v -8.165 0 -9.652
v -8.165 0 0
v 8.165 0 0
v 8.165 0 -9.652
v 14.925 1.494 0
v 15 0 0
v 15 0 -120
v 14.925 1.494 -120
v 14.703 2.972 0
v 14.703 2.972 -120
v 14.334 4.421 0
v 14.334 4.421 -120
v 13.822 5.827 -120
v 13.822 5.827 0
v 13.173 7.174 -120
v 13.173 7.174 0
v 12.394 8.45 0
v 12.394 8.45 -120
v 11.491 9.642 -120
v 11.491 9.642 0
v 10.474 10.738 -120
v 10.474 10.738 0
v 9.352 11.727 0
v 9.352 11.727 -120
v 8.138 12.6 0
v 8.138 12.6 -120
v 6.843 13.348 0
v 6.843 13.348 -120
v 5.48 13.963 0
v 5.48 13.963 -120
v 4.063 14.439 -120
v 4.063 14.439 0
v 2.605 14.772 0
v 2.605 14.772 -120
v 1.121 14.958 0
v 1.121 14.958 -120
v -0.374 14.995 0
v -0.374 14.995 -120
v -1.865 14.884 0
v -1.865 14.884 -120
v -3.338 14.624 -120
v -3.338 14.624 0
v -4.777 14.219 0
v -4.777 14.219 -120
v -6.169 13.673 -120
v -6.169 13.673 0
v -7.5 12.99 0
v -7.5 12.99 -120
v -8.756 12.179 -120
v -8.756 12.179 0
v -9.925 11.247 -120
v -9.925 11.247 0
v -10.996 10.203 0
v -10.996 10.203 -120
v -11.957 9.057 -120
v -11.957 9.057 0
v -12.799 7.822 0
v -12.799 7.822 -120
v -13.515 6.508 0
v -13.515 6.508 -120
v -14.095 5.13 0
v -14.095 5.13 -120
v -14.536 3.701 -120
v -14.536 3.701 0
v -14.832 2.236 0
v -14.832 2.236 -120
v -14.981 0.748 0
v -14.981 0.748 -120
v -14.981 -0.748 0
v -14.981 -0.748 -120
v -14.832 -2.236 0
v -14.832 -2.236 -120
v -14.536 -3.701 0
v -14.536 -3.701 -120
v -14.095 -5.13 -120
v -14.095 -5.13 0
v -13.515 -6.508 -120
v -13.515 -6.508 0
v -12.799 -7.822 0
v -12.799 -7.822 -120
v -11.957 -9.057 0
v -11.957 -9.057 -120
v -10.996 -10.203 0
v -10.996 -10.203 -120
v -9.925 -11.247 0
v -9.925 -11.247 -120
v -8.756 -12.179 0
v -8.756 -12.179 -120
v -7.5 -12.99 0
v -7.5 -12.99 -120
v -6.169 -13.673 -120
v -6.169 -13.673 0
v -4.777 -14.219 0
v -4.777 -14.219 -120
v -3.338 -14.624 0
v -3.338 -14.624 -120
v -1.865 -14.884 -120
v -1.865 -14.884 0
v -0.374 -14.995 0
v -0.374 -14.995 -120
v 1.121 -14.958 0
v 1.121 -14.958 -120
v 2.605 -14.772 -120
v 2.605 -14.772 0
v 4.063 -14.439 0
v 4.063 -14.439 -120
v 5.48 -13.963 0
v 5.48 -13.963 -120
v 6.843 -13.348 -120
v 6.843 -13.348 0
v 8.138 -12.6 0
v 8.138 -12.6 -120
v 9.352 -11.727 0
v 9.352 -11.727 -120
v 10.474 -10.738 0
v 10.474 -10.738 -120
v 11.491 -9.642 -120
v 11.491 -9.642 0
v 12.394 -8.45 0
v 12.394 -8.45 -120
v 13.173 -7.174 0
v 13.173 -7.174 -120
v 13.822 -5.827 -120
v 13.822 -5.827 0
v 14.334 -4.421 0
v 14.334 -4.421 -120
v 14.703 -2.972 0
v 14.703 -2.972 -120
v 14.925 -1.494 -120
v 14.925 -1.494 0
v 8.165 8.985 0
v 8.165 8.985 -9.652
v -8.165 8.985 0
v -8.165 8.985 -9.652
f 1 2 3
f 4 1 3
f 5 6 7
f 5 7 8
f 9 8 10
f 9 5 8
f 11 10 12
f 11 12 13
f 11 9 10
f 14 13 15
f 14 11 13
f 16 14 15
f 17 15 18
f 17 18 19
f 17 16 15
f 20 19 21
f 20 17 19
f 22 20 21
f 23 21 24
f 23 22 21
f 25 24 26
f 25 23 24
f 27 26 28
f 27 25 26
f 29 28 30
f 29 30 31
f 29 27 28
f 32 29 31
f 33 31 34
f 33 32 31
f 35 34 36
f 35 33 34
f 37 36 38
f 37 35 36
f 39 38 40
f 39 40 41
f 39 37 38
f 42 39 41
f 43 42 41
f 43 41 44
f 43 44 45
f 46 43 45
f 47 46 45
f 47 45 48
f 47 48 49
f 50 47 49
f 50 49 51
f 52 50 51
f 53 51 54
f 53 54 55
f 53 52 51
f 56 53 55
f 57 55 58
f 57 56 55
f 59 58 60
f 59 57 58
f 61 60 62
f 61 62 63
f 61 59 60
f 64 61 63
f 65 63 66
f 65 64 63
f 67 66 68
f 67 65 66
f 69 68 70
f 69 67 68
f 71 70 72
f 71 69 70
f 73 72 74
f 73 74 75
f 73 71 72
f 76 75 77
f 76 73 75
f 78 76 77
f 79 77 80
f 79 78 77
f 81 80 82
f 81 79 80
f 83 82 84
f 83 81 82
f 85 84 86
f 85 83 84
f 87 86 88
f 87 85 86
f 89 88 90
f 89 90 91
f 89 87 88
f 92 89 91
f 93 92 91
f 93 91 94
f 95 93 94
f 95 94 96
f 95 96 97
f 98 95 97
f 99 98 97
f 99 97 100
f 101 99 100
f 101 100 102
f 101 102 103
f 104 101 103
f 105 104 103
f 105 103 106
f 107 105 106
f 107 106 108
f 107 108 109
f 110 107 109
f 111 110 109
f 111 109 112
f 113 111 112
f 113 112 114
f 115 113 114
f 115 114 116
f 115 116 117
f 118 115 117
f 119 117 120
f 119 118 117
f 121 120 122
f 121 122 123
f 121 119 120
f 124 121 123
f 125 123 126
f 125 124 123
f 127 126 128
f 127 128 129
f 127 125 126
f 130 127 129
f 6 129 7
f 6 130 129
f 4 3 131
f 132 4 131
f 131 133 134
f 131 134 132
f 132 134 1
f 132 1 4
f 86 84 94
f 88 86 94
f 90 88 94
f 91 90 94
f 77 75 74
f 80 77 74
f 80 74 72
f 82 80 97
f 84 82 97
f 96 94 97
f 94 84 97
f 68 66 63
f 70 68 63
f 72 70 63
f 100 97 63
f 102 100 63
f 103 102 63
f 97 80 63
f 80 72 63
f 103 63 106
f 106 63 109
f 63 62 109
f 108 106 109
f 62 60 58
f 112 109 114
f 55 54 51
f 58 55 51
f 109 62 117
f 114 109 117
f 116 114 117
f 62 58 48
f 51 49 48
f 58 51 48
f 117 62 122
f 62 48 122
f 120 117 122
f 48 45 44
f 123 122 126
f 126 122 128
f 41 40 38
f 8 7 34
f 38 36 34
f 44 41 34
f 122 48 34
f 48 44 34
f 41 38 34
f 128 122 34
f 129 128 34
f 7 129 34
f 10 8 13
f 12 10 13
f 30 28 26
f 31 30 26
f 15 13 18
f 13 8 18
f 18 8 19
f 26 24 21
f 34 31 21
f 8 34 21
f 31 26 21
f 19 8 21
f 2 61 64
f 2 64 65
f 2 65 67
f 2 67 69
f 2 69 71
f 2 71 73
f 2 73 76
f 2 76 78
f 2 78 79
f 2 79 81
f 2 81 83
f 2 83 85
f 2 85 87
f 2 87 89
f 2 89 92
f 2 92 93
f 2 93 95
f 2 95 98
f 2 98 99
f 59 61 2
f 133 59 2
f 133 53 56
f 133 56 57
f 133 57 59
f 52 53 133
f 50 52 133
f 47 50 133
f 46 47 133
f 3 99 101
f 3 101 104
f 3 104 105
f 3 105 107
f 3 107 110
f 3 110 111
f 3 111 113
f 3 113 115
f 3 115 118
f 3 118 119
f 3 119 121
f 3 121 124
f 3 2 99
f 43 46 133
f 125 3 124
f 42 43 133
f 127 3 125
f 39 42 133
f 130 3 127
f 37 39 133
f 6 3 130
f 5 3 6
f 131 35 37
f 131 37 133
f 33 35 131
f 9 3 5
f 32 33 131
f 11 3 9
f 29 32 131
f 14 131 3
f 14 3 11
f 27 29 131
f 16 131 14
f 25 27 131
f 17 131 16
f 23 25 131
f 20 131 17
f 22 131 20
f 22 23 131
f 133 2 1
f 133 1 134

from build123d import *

# Parameters (mm, degrees)
F0_R     = 15
F1_DEPTH = 120
F2_W     = 16.33073
F2_H     = 8.984623
F3_DEPTH = 9.652


with BuildPart() as f1:
    # F0 (on Top) → F1 (new body)
    with BuildSketch(Plane.XY):
        Circle(F0_R)
    extrude(amount=-F1_DEPTH)

    # F2 (on Top) → F3 (cut)
    with BuildSketch(Plane.XY):
        with Locations((0, 4.492311)):
            Rectangle(F2_W, F2_H)
    extrude(amount=-F3_DEPTH, mode=Mode.SUBTRACT)


solid = f1.part
